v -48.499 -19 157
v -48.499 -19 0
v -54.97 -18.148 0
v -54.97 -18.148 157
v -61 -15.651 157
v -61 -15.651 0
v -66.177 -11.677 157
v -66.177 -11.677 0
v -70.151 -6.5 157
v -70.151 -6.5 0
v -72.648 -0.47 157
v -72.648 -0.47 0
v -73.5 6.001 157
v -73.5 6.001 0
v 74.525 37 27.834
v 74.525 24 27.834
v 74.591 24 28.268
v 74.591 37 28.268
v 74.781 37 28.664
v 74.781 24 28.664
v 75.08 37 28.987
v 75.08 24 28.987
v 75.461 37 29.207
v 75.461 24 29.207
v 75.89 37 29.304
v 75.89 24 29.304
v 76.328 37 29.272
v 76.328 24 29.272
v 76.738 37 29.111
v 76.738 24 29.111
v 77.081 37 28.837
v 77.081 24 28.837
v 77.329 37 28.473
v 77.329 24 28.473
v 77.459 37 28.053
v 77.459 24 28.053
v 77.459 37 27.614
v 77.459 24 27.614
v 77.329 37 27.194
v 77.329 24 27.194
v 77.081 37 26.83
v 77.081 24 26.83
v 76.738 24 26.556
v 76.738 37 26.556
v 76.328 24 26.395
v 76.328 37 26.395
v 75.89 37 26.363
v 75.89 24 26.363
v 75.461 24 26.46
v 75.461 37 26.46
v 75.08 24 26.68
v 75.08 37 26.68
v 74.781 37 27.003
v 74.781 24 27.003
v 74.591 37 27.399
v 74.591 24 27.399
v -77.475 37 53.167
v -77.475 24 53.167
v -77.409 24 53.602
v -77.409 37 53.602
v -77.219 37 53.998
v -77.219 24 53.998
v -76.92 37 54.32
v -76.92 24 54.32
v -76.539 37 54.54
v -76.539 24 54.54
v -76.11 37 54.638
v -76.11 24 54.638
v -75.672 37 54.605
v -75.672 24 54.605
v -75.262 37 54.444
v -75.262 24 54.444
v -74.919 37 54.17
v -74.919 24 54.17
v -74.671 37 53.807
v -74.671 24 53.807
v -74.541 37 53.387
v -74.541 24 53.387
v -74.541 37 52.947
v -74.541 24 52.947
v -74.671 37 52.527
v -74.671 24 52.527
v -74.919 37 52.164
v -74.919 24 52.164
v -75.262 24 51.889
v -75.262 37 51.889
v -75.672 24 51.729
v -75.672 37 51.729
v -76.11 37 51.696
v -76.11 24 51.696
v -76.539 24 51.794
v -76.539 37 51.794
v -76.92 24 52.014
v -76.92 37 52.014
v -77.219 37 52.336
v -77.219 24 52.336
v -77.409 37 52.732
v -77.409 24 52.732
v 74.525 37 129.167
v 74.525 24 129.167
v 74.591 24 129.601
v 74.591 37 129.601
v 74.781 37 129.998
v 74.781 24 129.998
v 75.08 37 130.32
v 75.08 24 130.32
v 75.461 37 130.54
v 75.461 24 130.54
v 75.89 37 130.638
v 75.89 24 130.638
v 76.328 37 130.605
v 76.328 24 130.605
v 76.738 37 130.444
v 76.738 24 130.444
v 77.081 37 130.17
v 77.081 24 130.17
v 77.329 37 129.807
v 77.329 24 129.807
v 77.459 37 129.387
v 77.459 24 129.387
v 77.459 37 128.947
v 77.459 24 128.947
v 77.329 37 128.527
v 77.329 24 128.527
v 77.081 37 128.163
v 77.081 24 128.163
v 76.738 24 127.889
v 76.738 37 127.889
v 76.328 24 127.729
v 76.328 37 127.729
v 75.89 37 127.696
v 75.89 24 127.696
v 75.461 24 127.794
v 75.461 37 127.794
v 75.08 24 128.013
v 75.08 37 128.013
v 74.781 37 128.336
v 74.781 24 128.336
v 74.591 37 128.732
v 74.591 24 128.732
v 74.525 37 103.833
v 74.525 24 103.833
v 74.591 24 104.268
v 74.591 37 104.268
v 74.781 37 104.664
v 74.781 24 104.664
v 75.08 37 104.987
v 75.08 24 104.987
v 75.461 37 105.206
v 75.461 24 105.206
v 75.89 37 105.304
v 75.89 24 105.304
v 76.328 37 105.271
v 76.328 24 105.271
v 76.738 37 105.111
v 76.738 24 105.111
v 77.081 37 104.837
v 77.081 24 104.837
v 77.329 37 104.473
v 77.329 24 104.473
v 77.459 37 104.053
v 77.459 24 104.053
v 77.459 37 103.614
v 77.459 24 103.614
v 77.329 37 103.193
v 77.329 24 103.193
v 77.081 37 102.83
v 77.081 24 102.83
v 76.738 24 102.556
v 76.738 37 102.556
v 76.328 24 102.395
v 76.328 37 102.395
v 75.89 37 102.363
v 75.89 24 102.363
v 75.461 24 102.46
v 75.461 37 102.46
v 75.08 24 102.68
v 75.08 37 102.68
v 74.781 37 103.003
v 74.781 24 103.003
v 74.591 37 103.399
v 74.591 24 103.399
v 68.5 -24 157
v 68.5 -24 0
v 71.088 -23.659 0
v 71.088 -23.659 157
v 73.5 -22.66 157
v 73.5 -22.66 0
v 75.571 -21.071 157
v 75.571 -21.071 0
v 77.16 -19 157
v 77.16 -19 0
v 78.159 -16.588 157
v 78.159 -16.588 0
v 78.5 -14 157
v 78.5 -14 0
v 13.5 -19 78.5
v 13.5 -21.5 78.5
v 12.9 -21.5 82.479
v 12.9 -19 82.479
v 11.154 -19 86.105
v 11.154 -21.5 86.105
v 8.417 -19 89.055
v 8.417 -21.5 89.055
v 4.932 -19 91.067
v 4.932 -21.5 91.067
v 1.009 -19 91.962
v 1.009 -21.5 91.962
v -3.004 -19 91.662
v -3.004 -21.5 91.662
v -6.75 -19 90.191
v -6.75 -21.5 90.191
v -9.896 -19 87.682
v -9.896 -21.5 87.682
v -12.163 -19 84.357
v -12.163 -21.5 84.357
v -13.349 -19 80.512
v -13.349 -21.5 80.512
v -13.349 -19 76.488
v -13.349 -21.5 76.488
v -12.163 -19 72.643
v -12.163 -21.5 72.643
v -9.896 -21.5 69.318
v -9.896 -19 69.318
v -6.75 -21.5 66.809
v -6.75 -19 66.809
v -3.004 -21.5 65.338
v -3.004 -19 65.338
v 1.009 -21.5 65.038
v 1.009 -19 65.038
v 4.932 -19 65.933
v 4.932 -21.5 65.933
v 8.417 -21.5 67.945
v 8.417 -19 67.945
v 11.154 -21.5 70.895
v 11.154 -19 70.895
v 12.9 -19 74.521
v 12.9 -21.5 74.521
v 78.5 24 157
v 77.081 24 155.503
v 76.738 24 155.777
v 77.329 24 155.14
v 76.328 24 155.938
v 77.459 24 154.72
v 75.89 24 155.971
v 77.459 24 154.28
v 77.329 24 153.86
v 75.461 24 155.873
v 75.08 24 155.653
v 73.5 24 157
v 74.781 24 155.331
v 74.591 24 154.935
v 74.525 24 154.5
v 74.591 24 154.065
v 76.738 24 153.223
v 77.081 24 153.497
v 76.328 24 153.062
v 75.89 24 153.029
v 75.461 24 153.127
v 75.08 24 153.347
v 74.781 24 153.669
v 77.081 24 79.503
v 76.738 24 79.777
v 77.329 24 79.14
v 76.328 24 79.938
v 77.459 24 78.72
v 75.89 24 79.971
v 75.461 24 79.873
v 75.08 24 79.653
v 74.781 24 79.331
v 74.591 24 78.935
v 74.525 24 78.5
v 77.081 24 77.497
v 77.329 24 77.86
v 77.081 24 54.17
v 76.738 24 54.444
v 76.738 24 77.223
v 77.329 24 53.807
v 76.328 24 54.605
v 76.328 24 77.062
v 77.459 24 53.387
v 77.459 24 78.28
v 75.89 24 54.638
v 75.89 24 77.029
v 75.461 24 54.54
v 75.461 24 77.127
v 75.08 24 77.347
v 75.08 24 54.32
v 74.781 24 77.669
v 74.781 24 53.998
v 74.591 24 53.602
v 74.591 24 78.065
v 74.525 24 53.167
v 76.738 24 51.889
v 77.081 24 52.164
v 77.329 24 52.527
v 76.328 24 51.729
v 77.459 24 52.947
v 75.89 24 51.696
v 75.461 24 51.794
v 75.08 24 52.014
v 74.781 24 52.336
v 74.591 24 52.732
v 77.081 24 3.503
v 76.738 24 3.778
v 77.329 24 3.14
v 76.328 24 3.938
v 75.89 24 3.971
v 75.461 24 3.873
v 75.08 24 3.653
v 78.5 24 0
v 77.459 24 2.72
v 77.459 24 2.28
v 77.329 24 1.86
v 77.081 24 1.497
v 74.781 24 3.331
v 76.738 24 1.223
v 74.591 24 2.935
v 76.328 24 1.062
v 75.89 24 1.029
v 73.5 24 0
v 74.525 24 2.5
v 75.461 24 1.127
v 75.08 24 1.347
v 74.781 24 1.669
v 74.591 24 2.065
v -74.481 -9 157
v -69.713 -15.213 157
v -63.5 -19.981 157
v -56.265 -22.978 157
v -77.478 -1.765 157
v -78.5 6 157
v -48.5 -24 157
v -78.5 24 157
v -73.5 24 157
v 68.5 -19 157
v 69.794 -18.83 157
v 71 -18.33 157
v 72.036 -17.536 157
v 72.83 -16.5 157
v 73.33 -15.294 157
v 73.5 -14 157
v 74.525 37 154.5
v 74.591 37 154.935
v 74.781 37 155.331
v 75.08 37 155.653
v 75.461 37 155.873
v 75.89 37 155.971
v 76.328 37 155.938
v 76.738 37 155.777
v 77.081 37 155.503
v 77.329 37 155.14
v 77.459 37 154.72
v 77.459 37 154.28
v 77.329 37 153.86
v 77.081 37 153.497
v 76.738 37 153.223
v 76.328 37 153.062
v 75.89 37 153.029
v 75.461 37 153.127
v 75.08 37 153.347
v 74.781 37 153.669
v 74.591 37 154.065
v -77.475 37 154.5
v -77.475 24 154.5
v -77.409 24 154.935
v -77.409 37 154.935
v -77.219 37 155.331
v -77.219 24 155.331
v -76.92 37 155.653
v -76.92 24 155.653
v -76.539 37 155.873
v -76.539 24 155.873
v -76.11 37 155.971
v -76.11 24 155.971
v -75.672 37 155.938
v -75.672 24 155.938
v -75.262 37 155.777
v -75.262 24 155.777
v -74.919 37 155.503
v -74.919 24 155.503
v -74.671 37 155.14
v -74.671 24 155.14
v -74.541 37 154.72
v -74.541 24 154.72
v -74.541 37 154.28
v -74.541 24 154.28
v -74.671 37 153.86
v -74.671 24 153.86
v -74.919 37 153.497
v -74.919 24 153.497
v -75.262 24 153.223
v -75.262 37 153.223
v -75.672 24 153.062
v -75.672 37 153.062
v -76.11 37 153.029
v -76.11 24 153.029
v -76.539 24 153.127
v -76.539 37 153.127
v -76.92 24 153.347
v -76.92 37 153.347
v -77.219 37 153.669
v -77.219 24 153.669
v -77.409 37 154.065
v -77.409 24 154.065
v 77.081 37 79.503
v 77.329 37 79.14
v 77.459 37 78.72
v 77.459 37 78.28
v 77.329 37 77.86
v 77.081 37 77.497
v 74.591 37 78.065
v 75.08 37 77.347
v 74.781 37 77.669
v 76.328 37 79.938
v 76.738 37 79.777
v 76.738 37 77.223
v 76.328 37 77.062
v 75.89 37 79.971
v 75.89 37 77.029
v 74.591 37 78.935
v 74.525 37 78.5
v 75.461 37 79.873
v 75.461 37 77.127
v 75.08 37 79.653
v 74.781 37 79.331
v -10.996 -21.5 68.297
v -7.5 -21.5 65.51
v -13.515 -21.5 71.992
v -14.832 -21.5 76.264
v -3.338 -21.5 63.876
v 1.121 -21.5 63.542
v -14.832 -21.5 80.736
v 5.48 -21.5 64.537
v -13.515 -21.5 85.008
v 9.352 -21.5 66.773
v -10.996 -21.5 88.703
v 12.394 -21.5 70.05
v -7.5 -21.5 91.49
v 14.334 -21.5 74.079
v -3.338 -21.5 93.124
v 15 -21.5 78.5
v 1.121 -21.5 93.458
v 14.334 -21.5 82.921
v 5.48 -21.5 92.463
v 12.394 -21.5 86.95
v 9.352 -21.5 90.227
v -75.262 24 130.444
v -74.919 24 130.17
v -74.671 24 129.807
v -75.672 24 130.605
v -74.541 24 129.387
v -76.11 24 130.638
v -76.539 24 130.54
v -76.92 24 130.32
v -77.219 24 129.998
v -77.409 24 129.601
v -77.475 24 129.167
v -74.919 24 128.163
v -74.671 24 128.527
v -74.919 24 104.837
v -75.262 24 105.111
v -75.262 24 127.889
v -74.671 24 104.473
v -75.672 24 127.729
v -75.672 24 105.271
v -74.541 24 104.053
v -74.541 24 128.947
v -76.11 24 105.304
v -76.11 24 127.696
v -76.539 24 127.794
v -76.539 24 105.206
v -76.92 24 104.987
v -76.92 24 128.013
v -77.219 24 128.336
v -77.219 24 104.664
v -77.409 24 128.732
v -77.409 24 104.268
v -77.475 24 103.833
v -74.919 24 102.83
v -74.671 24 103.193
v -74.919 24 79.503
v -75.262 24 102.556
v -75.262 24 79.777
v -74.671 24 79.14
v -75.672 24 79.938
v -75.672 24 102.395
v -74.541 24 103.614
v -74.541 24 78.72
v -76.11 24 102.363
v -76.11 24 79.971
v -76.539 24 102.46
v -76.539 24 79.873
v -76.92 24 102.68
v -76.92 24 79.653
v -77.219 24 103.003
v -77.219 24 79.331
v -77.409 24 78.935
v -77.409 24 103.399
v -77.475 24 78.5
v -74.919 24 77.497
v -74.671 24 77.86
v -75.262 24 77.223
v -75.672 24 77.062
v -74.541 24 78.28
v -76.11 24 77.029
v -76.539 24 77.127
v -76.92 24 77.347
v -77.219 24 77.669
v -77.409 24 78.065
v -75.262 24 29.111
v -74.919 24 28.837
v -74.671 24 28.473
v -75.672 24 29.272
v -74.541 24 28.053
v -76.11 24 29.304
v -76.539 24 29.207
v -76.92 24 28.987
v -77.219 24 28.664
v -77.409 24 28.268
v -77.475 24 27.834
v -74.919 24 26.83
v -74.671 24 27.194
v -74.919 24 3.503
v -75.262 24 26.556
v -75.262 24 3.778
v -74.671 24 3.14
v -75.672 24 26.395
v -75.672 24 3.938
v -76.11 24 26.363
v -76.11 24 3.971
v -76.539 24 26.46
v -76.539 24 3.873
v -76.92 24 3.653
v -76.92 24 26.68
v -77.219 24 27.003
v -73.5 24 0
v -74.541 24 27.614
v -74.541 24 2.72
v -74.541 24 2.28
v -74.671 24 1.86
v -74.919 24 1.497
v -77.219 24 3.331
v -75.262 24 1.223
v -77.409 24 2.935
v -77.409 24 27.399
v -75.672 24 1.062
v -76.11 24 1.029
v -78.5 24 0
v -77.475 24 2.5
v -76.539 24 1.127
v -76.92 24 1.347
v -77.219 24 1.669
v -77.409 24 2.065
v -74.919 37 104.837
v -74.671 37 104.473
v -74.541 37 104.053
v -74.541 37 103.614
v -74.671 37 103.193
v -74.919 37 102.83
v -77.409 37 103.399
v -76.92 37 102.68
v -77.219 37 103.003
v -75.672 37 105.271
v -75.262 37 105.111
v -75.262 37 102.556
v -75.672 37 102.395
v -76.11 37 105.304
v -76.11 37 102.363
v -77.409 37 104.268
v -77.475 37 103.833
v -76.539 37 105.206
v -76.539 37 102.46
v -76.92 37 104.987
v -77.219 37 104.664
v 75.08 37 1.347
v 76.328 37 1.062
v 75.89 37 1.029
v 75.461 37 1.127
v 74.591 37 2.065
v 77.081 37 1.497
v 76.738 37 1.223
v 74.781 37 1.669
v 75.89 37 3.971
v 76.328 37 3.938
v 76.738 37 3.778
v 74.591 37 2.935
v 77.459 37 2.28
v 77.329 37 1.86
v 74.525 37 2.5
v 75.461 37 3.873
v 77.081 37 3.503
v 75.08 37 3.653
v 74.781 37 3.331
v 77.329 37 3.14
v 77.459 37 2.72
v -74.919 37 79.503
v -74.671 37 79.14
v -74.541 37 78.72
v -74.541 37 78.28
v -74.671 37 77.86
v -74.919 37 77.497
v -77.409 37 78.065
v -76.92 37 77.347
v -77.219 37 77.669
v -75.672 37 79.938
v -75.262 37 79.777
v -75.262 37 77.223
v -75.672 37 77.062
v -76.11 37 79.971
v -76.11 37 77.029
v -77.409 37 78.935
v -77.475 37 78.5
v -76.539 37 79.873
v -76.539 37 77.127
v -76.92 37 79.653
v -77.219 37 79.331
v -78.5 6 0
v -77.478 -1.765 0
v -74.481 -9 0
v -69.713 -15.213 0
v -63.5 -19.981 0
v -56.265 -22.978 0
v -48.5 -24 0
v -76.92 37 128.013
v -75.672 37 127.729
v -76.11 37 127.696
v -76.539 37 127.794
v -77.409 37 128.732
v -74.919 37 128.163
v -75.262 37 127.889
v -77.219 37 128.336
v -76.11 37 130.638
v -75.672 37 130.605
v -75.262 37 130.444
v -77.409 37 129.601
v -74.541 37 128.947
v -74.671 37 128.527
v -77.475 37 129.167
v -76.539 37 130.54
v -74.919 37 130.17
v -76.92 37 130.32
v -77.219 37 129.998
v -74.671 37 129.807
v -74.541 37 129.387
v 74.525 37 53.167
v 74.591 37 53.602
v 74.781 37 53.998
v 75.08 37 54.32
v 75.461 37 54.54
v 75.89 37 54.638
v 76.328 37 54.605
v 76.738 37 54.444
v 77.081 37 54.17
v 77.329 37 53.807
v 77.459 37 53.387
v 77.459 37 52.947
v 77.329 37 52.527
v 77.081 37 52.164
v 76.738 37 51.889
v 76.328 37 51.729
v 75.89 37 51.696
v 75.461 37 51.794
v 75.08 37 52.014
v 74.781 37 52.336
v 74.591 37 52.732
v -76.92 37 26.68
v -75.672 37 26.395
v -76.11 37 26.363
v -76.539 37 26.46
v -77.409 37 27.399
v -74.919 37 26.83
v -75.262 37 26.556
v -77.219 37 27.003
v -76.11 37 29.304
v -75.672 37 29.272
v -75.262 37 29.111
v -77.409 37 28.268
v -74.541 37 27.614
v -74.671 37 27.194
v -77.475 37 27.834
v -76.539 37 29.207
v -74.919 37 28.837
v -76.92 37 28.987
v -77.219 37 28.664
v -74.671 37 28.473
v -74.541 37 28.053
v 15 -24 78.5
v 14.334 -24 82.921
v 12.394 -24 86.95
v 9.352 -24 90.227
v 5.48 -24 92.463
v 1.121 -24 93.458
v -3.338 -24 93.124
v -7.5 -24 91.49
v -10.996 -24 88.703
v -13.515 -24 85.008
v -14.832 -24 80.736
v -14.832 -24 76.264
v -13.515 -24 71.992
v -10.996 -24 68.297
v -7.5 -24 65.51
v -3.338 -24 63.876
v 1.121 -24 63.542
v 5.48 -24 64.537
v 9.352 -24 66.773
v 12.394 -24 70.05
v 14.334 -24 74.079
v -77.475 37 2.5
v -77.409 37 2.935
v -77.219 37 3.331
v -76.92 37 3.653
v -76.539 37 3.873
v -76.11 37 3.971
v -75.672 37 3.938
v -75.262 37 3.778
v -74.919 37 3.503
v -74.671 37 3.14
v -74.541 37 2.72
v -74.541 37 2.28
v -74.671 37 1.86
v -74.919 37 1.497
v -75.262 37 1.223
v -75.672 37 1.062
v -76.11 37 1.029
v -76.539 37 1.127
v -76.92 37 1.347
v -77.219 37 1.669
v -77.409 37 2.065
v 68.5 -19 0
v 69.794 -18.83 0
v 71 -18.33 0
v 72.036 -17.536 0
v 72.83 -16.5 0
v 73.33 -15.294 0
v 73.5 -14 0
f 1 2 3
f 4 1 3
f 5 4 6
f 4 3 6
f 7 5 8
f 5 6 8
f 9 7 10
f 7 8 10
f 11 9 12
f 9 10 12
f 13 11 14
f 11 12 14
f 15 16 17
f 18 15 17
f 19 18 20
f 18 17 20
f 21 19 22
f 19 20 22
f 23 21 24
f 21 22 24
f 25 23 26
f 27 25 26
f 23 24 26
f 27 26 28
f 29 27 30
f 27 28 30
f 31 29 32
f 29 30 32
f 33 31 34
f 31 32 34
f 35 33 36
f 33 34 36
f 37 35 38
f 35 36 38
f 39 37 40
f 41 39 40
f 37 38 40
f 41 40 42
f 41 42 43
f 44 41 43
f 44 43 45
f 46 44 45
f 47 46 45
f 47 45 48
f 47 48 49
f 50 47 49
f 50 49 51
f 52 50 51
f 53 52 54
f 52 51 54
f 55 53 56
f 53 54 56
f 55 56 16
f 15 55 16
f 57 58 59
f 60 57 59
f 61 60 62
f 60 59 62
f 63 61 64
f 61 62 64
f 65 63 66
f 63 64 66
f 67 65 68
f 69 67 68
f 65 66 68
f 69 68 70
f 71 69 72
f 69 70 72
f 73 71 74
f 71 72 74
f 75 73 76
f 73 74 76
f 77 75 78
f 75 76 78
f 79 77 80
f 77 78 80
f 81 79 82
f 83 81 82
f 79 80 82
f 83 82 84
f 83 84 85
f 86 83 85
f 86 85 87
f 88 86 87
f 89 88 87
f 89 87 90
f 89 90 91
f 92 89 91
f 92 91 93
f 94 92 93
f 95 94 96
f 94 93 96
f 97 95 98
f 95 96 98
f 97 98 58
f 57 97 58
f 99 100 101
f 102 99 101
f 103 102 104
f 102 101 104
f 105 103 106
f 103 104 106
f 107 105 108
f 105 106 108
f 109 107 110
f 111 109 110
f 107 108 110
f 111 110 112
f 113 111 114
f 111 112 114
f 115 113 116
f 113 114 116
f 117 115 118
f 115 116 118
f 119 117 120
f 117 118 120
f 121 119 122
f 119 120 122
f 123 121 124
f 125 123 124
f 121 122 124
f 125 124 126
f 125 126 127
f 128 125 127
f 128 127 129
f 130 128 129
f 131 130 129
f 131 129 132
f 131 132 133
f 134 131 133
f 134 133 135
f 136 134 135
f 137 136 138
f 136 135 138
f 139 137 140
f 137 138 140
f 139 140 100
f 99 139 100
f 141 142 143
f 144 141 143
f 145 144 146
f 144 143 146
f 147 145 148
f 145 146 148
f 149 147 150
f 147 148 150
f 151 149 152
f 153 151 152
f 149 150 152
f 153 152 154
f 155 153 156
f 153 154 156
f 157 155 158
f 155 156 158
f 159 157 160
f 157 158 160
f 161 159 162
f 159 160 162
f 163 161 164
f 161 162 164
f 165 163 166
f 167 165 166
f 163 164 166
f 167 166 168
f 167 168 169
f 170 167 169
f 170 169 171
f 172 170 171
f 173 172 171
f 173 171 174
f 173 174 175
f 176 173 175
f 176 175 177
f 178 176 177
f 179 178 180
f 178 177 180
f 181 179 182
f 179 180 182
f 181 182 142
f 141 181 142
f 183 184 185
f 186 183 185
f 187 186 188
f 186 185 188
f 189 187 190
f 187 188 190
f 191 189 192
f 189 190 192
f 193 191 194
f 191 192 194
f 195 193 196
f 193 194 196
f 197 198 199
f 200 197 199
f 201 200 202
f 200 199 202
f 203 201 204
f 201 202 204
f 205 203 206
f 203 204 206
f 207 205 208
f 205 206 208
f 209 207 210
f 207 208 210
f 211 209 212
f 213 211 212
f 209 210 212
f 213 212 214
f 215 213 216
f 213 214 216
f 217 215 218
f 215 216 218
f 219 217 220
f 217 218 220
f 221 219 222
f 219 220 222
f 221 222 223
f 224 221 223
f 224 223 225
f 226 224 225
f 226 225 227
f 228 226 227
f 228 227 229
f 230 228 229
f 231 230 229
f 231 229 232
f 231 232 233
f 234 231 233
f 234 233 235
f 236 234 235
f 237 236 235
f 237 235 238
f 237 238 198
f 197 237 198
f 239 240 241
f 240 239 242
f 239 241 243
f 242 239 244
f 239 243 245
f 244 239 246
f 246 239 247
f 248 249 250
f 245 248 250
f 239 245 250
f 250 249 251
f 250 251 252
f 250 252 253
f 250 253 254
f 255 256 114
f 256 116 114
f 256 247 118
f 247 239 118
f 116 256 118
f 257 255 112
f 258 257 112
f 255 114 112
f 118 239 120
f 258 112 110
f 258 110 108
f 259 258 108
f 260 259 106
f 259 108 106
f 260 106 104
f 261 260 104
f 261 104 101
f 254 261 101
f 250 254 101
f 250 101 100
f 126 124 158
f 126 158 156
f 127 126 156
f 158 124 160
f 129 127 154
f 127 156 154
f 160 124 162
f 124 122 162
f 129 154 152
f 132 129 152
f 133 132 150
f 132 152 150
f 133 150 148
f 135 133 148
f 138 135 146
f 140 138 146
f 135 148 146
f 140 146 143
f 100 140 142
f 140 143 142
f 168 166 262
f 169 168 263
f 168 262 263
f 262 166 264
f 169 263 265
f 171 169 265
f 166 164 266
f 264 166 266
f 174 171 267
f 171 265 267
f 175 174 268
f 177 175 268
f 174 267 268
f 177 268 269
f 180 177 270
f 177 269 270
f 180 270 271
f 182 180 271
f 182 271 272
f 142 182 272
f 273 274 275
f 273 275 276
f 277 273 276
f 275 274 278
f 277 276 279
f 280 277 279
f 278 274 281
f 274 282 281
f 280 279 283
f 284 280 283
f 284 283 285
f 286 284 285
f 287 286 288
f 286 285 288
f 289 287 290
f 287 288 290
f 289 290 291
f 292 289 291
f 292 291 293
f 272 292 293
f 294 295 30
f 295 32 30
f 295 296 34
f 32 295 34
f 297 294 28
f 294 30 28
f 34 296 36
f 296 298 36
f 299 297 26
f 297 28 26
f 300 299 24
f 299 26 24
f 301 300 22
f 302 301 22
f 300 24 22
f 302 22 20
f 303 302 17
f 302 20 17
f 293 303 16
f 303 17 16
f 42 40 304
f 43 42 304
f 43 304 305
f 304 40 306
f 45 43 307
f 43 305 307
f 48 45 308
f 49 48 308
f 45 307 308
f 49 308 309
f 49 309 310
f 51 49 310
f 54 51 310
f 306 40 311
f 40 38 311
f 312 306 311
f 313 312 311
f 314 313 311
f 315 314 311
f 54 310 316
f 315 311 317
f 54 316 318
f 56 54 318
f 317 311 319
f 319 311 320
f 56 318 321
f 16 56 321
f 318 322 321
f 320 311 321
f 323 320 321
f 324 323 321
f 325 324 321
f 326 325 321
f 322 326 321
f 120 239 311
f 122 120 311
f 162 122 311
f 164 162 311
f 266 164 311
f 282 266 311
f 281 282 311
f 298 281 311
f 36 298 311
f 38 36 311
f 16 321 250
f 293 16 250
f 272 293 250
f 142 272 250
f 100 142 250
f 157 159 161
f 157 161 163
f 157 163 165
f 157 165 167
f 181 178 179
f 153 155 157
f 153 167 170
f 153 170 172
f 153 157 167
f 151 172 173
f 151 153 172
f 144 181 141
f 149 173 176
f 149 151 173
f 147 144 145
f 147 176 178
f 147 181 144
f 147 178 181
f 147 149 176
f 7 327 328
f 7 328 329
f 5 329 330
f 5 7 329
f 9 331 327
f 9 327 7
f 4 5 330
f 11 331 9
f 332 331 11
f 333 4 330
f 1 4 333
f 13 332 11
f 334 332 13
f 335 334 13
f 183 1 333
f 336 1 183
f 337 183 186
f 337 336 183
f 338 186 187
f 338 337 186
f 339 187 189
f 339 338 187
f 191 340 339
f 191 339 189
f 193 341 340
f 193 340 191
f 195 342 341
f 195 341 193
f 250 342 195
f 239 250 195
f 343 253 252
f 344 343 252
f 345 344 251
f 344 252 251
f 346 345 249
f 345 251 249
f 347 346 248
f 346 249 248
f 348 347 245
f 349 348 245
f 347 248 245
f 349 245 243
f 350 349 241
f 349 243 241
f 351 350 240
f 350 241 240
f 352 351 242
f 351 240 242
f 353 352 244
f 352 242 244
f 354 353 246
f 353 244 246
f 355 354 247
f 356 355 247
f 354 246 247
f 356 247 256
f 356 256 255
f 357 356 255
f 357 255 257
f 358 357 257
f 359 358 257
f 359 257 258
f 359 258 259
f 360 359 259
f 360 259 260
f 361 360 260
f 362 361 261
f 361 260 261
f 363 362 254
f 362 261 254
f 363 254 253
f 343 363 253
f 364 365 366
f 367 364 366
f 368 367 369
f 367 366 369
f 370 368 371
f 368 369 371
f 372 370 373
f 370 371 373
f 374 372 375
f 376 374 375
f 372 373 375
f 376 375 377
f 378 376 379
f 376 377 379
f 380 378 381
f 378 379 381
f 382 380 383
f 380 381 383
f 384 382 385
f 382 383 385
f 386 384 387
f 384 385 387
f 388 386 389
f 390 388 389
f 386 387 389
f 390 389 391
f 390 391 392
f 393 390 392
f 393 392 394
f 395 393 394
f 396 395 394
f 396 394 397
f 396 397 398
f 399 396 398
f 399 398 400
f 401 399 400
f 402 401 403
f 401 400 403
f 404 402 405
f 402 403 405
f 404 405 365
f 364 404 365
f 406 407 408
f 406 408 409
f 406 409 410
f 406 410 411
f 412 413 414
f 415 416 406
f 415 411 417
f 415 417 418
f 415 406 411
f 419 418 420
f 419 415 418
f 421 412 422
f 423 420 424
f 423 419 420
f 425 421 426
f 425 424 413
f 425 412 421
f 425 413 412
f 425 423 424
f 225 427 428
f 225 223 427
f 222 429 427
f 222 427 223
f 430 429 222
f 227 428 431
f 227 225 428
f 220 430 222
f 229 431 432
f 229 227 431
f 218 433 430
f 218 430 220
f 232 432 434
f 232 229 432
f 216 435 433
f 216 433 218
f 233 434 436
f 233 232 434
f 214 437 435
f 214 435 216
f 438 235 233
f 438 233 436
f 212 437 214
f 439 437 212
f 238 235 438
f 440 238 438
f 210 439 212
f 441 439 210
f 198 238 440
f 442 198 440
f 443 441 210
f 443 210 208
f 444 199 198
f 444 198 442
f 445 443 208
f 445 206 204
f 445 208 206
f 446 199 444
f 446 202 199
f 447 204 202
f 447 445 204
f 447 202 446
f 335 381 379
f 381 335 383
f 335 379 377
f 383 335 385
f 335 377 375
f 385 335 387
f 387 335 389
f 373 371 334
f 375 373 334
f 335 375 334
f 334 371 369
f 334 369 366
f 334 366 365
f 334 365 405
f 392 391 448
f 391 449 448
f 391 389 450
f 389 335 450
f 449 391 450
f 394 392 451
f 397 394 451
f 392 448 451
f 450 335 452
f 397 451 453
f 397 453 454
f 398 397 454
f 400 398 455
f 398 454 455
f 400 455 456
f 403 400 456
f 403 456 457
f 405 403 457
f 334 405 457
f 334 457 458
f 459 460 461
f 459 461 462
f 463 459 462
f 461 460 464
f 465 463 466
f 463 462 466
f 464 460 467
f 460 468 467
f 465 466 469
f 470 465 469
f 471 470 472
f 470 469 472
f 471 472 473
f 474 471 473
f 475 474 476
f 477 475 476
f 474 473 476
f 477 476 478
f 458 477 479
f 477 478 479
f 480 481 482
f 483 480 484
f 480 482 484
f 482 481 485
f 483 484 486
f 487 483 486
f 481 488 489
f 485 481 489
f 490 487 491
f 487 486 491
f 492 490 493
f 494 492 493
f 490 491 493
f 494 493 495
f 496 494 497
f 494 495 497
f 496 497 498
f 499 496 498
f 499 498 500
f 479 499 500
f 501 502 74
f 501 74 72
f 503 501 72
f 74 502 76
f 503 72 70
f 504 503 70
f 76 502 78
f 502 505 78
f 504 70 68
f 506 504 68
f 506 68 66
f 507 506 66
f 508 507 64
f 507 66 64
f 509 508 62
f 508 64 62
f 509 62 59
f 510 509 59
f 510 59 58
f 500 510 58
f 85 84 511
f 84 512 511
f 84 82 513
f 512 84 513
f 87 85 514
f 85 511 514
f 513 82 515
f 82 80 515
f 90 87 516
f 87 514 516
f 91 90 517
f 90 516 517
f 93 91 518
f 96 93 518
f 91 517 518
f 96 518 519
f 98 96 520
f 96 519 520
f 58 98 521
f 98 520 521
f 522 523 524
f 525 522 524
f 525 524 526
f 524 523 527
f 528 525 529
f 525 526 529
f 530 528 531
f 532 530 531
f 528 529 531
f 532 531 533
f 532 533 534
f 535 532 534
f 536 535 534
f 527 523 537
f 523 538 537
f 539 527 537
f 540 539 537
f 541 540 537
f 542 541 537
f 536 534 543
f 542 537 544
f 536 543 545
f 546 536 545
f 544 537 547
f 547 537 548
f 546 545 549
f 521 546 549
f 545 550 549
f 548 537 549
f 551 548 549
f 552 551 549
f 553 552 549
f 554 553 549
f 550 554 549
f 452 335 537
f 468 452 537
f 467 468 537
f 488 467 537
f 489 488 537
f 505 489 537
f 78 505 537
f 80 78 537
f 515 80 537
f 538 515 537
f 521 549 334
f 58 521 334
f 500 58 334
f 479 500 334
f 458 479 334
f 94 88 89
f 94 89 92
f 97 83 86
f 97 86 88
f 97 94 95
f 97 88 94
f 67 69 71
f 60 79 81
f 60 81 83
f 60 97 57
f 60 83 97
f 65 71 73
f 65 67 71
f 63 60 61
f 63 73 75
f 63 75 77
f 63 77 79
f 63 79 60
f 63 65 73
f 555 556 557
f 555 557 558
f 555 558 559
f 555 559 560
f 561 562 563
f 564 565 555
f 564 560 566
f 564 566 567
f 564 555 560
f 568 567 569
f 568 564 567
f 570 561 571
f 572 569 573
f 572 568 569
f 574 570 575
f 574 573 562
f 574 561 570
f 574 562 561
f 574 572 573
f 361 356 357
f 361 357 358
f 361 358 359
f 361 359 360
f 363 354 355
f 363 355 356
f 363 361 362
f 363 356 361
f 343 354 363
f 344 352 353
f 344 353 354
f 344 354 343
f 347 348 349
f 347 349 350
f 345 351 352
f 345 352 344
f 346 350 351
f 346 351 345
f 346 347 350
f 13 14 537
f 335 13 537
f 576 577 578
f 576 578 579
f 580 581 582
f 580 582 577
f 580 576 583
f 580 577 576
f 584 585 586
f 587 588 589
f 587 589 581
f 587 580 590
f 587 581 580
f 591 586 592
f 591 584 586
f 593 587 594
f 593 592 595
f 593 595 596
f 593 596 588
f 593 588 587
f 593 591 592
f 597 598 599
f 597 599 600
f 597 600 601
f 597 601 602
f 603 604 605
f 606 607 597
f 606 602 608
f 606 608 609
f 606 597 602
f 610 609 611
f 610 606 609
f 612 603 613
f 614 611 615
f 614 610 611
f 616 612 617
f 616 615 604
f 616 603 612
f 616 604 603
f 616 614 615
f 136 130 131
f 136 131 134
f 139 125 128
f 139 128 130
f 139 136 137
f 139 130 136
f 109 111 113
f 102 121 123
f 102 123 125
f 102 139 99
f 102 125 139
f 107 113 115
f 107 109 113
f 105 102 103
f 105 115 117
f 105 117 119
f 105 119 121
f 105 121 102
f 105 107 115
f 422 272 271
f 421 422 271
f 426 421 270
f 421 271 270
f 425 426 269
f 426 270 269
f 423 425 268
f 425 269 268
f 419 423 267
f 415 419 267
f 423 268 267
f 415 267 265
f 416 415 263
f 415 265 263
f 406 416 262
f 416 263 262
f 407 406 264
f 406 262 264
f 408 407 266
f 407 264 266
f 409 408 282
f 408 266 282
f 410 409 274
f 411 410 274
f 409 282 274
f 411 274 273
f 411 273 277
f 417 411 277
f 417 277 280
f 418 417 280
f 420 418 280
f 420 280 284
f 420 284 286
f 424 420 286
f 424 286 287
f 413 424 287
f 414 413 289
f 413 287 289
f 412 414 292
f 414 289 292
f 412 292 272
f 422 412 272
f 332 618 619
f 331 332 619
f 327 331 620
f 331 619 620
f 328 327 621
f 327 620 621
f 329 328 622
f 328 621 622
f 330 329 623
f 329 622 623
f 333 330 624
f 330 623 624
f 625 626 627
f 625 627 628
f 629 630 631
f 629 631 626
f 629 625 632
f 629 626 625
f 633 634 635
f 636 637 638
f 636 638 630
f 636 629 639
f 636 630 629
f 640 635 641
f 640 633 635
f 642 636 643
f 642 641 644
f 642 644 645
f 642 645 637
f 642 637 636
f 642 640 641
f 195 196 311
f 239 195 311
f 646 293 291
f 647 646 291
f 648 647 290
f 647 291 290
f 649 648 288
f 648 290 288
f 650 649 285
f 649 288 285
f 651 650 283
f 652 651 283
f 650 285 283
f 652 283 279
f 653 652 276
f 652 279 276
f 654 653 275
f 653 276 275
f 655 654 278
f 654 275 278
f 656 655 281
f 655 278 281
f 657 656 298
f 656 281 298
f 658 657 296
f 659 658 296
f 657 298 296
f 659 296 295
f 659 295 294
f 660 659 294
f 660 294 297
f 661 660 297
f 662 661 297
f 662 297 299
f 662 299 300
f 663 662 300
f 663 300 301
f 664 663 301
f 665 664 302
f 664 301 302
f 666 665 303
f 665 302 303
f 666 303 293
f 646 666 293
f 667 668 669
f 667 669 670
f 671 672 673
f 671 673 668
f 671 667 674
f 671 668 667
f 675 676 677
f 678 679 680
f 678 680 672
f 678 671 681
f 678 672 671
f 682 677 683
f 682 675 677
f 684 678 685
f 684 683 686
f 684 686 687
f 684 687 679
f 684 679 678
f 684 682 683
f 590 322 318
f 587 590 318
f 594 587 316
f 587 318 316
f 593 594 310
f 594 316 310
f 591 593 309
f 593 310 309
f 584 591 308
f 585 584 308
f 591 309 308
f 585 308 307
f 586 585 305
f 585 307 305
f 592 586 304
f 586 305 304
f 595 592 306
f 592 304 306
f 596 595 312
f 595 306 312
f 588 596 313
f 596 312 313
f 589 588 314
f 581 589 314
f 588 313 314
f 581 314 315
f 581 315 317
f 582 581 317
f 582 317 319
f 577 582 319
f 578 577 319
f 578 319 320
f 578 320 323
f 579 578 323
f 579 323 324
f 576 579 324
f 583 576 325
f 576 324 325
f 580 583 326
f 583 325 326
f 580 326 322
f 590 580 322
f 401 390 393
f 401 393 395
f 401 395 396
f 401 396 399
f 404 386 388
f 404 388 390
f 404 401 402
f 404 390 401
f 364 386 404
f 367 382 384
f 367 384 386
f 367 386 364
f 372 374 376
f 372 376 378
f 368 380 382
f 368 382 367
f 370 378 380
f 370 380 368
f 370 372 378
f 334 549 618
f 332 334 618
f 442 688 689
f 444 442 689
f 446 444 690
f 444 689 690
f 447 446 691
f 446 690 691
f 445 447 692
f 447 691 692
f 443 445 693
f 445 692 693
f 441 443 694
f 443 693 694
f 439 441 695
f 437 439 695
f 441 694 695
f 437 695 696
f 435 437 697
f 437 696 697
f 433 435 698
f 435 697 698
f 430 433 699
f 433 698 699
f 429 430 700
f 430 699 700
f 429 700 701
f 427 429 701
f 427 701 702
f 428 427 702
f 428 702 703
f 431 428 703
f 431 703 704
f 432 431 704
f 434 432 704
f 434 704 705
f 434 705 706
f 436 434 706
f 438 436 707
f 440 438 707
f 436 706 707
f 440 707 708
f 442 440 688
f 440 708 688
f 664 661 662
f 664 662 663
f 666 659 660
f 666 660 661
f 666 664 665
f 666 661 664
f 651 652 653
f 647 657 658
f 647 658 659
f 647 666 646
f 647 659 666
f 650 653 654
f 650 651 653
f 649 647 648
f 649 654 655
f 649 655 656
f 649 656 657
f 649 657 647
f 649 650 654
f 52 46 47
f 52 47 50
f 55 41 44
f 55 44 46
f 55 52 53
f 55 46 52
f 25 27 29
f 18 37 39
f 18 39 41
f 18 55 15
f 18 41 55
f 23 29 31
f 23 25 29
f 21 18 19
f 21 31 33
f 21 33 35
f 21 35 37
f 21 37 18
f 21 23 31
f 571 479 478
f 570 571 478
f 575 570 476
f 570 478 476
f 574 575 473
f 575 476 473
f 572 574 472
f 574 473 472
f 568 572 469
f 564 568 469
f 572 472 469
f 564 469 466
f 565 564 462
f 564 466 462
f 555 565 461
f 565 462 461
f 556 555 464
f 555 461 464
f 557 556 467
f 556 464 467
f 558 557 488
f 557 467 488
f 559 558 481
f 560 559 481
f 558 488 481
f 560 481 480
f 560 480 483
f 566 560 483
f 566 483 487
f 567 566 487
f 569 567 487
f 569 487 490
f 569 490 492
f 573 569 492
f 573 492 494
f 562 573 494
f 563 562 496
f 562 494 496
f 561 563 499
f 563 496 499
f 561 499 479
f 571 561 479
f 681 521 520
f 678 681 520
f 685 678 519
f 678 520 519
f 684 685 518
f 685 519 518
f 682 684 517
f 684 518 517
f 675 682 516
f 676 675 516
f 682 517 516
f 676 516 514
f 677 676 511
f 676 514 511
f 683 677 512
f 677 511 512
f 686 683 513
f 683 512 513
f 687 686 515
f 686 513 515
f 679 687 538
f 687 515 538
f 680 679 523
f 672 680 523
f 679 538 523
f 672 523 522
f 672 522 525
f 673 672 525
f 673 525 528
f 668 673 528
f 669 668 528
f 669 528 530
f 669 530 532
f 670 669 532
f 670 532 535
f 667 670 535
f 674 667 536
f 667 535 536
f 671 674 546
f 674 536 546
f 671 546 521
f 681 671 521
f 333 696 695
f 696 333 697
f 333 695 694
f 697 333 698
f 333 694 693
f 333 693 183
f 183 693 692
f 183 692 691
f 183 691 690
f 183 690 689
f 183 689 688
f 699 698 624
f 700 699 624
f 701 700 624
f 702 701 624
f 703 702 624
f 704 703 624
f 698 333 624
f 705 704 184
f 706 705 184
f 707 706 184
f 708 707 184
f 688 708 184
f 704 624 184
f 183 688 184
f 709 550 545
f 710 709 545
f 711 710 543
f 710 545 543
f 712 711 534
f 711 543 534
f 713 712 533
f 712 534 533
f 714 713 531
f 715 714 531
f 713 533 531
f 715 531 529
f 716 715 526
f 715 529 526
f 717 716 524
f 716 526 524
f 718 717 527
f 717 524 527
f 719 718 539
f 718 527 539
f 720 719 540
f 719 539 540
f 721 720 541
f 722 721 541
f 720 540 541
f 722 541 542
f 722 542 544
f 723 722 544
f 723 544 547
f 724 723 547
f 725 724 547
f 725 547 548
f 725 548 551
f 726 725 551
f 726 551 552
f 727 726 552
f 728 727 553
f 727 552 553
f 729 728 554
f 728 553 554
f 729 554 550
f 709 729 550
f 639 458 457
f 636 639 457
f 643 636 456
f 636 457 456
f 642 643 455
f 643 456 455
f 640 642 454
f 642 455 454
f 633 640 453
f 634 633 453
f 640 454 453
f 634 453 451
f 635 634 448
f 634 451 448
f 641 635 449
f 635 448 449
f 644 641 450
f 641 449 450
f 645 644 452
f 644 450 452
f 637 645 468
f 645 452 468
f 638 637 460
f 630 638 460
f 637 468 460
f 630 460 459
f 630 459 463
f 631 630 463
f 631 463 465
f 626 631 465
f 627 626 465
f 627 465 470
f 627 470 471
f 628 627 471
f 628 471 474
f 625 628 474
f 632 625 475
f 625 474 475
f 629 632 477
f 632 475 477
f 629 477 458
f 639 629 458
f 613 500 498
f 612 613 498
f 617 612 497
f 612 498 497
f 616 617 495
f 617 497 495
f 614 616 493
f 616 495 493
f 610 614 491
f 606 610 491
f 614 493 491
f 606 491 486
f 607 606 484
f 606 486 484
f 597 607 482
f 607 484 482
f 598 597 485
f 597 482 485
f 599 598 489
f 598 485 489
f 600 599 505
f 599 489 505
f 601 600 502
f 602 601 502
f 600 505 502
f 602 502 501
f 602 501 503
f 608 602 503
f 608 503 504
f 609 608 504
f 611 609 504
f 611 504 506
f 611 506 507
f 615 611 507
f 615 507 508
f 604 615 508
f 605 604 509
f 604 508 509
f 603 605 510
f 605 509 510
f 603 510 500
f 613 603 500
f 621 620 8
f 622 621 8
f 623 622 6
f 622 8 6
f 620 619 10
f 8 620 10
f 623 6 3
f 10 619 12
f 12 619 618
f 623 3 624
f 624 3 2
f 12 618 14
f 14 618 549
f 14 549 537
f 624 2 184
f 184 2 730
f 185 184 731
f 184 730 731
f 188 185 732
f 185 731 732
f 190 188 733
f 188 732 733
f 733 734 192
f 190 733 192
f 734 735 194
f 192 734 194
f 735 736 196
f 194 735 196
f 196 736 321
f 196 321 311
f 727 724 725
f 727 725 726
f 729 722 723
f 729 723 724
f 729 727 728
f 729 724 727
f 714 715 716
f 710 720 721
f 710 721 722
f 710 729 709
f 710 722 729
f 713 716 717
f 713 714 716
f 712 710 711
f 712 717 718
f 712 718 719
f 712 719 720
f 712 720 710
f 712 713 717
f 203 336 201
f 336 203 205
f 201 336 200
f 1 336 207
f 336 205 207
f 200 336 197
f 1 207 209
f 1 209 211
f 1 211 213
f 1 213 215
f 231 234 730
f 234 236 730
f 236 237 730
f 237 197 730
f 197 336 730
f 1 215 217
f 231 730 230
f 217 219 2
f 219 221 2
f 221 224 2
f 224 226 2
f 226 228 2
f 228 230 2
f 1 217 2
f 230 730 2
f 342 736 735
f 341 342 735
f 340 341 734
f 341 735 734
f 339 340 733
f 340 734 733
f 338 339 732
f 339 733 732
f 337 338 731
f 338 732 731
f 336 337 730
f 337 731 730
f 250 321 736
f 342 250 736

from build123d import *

# Parameters (mm, degrees)
F1_DEPTH = 157
F2_R     = 13.5
F3_DEPTH = 25
F4_R     = 15
F5_DEPTH = 2.5
F6_R     = 1.475
F7_DEPTH = 13
F8_R     = 1.475
F9_DEPTH = 13


with BuildPart() as f1:
    # F0 (on Top) → F1 (new body)
    with BuildSketch(Plane.XY):
        with BuildLine():
            Line((-48.5, -24), (68.5, -24))
            ThreePointArc((68.5, -24), (75.571068, -21.071068), (78.5, -14))
            Line((78.5, -14), (78.5, 24))
            Line((78.5, 24), (73.5, 24))
            Line((73.5, 24), (73.5, -14))
            ThreePointArc((73.5, -14), (72.035534, -17.535534), (68.5, -19))
            Line((68.5, -19), (-48.499, -19))
            ThreePointArc((-48.499, -19), (-66.177377, -11.677377), (-73.5, 6.001))
            Line((-73.5, 6.001), (-73.5, 24))
            Line((-73.5, 24), (-78.5, 24))
            Line((-78.5, 24), (-78.5, 6))
            ThreePointArc((-78.5, 6), (-69.713203, -15.213203), (-48.5, -24))
        make_face()
    extrude(amount=F1_DEPTH)

    # F2 (on face) → F3 (cut)
    with BuildSketch(Plane.XZ.offset(24)):
        with Locations((0, 78.5)):
            Circle(F2_R)
    extrude(amount=-F3_DEPTH, mode=Mode.SUBTRACT)

    # F4 (on face) → F5 (cut)
    with BuildSketch(Plane.XZ.offset(24)):
        with Locations((0, 78.5)):
            Circle(F4_R)
    extrude(amount=-F5_DEPTH, mode=Mode.SUBTRACT)

    # F6 (on face) → F7 (join)
    with BuildSketch(Plane(origin=(0, 24, 0), x_dir=(-1, 0, 0), z_dir=(0, 1, 0))):
        with Locations((-76, 154.5)):
            Circle(F6_R)
        with Locations((-76, 129.1667)):
            Circle(F6_R)
        with Locations((-76, 103.8334)):
            Circle(F6_R)
        with Locations((-76, 78.5001)):
            Circle(F6_R)
        with Locations((-76, 53.1668)):
            Circle(F6_R)
        with Locations((-76, 27.8335)):
            Circle(F6_R)
        with Locations((-76, 2.5002)):
            Circle(F6_R)
    extrude(amount=F7_DEPTH)

    # F8 (on face) → F9 (join)
    with BuildSketch(Plane(origin=(0, 24, 0), x_dir=(-1, 0, 0), z_dir=(0, 1, 0))):
        with Locations((76, 103.8334)):
            Circle(F8_R)
        with Locations((76, 129.1667)):
            Circle(F8_R)
        with Locations((76, 154.5)):
            Circle(F8_R)
        with Locations((76, 78.5001)):
            Circle(F8_R)
        with Locations((76, 53.1668)):
            Circle(F8_R)
        with Locations((76, 2.5002)):
            Circle(F8_R)
        with Locations((76, 27.8335)):
            Circle(F8_R)
    extrude(amount=F9_DEPTH)


solid = f1.part
